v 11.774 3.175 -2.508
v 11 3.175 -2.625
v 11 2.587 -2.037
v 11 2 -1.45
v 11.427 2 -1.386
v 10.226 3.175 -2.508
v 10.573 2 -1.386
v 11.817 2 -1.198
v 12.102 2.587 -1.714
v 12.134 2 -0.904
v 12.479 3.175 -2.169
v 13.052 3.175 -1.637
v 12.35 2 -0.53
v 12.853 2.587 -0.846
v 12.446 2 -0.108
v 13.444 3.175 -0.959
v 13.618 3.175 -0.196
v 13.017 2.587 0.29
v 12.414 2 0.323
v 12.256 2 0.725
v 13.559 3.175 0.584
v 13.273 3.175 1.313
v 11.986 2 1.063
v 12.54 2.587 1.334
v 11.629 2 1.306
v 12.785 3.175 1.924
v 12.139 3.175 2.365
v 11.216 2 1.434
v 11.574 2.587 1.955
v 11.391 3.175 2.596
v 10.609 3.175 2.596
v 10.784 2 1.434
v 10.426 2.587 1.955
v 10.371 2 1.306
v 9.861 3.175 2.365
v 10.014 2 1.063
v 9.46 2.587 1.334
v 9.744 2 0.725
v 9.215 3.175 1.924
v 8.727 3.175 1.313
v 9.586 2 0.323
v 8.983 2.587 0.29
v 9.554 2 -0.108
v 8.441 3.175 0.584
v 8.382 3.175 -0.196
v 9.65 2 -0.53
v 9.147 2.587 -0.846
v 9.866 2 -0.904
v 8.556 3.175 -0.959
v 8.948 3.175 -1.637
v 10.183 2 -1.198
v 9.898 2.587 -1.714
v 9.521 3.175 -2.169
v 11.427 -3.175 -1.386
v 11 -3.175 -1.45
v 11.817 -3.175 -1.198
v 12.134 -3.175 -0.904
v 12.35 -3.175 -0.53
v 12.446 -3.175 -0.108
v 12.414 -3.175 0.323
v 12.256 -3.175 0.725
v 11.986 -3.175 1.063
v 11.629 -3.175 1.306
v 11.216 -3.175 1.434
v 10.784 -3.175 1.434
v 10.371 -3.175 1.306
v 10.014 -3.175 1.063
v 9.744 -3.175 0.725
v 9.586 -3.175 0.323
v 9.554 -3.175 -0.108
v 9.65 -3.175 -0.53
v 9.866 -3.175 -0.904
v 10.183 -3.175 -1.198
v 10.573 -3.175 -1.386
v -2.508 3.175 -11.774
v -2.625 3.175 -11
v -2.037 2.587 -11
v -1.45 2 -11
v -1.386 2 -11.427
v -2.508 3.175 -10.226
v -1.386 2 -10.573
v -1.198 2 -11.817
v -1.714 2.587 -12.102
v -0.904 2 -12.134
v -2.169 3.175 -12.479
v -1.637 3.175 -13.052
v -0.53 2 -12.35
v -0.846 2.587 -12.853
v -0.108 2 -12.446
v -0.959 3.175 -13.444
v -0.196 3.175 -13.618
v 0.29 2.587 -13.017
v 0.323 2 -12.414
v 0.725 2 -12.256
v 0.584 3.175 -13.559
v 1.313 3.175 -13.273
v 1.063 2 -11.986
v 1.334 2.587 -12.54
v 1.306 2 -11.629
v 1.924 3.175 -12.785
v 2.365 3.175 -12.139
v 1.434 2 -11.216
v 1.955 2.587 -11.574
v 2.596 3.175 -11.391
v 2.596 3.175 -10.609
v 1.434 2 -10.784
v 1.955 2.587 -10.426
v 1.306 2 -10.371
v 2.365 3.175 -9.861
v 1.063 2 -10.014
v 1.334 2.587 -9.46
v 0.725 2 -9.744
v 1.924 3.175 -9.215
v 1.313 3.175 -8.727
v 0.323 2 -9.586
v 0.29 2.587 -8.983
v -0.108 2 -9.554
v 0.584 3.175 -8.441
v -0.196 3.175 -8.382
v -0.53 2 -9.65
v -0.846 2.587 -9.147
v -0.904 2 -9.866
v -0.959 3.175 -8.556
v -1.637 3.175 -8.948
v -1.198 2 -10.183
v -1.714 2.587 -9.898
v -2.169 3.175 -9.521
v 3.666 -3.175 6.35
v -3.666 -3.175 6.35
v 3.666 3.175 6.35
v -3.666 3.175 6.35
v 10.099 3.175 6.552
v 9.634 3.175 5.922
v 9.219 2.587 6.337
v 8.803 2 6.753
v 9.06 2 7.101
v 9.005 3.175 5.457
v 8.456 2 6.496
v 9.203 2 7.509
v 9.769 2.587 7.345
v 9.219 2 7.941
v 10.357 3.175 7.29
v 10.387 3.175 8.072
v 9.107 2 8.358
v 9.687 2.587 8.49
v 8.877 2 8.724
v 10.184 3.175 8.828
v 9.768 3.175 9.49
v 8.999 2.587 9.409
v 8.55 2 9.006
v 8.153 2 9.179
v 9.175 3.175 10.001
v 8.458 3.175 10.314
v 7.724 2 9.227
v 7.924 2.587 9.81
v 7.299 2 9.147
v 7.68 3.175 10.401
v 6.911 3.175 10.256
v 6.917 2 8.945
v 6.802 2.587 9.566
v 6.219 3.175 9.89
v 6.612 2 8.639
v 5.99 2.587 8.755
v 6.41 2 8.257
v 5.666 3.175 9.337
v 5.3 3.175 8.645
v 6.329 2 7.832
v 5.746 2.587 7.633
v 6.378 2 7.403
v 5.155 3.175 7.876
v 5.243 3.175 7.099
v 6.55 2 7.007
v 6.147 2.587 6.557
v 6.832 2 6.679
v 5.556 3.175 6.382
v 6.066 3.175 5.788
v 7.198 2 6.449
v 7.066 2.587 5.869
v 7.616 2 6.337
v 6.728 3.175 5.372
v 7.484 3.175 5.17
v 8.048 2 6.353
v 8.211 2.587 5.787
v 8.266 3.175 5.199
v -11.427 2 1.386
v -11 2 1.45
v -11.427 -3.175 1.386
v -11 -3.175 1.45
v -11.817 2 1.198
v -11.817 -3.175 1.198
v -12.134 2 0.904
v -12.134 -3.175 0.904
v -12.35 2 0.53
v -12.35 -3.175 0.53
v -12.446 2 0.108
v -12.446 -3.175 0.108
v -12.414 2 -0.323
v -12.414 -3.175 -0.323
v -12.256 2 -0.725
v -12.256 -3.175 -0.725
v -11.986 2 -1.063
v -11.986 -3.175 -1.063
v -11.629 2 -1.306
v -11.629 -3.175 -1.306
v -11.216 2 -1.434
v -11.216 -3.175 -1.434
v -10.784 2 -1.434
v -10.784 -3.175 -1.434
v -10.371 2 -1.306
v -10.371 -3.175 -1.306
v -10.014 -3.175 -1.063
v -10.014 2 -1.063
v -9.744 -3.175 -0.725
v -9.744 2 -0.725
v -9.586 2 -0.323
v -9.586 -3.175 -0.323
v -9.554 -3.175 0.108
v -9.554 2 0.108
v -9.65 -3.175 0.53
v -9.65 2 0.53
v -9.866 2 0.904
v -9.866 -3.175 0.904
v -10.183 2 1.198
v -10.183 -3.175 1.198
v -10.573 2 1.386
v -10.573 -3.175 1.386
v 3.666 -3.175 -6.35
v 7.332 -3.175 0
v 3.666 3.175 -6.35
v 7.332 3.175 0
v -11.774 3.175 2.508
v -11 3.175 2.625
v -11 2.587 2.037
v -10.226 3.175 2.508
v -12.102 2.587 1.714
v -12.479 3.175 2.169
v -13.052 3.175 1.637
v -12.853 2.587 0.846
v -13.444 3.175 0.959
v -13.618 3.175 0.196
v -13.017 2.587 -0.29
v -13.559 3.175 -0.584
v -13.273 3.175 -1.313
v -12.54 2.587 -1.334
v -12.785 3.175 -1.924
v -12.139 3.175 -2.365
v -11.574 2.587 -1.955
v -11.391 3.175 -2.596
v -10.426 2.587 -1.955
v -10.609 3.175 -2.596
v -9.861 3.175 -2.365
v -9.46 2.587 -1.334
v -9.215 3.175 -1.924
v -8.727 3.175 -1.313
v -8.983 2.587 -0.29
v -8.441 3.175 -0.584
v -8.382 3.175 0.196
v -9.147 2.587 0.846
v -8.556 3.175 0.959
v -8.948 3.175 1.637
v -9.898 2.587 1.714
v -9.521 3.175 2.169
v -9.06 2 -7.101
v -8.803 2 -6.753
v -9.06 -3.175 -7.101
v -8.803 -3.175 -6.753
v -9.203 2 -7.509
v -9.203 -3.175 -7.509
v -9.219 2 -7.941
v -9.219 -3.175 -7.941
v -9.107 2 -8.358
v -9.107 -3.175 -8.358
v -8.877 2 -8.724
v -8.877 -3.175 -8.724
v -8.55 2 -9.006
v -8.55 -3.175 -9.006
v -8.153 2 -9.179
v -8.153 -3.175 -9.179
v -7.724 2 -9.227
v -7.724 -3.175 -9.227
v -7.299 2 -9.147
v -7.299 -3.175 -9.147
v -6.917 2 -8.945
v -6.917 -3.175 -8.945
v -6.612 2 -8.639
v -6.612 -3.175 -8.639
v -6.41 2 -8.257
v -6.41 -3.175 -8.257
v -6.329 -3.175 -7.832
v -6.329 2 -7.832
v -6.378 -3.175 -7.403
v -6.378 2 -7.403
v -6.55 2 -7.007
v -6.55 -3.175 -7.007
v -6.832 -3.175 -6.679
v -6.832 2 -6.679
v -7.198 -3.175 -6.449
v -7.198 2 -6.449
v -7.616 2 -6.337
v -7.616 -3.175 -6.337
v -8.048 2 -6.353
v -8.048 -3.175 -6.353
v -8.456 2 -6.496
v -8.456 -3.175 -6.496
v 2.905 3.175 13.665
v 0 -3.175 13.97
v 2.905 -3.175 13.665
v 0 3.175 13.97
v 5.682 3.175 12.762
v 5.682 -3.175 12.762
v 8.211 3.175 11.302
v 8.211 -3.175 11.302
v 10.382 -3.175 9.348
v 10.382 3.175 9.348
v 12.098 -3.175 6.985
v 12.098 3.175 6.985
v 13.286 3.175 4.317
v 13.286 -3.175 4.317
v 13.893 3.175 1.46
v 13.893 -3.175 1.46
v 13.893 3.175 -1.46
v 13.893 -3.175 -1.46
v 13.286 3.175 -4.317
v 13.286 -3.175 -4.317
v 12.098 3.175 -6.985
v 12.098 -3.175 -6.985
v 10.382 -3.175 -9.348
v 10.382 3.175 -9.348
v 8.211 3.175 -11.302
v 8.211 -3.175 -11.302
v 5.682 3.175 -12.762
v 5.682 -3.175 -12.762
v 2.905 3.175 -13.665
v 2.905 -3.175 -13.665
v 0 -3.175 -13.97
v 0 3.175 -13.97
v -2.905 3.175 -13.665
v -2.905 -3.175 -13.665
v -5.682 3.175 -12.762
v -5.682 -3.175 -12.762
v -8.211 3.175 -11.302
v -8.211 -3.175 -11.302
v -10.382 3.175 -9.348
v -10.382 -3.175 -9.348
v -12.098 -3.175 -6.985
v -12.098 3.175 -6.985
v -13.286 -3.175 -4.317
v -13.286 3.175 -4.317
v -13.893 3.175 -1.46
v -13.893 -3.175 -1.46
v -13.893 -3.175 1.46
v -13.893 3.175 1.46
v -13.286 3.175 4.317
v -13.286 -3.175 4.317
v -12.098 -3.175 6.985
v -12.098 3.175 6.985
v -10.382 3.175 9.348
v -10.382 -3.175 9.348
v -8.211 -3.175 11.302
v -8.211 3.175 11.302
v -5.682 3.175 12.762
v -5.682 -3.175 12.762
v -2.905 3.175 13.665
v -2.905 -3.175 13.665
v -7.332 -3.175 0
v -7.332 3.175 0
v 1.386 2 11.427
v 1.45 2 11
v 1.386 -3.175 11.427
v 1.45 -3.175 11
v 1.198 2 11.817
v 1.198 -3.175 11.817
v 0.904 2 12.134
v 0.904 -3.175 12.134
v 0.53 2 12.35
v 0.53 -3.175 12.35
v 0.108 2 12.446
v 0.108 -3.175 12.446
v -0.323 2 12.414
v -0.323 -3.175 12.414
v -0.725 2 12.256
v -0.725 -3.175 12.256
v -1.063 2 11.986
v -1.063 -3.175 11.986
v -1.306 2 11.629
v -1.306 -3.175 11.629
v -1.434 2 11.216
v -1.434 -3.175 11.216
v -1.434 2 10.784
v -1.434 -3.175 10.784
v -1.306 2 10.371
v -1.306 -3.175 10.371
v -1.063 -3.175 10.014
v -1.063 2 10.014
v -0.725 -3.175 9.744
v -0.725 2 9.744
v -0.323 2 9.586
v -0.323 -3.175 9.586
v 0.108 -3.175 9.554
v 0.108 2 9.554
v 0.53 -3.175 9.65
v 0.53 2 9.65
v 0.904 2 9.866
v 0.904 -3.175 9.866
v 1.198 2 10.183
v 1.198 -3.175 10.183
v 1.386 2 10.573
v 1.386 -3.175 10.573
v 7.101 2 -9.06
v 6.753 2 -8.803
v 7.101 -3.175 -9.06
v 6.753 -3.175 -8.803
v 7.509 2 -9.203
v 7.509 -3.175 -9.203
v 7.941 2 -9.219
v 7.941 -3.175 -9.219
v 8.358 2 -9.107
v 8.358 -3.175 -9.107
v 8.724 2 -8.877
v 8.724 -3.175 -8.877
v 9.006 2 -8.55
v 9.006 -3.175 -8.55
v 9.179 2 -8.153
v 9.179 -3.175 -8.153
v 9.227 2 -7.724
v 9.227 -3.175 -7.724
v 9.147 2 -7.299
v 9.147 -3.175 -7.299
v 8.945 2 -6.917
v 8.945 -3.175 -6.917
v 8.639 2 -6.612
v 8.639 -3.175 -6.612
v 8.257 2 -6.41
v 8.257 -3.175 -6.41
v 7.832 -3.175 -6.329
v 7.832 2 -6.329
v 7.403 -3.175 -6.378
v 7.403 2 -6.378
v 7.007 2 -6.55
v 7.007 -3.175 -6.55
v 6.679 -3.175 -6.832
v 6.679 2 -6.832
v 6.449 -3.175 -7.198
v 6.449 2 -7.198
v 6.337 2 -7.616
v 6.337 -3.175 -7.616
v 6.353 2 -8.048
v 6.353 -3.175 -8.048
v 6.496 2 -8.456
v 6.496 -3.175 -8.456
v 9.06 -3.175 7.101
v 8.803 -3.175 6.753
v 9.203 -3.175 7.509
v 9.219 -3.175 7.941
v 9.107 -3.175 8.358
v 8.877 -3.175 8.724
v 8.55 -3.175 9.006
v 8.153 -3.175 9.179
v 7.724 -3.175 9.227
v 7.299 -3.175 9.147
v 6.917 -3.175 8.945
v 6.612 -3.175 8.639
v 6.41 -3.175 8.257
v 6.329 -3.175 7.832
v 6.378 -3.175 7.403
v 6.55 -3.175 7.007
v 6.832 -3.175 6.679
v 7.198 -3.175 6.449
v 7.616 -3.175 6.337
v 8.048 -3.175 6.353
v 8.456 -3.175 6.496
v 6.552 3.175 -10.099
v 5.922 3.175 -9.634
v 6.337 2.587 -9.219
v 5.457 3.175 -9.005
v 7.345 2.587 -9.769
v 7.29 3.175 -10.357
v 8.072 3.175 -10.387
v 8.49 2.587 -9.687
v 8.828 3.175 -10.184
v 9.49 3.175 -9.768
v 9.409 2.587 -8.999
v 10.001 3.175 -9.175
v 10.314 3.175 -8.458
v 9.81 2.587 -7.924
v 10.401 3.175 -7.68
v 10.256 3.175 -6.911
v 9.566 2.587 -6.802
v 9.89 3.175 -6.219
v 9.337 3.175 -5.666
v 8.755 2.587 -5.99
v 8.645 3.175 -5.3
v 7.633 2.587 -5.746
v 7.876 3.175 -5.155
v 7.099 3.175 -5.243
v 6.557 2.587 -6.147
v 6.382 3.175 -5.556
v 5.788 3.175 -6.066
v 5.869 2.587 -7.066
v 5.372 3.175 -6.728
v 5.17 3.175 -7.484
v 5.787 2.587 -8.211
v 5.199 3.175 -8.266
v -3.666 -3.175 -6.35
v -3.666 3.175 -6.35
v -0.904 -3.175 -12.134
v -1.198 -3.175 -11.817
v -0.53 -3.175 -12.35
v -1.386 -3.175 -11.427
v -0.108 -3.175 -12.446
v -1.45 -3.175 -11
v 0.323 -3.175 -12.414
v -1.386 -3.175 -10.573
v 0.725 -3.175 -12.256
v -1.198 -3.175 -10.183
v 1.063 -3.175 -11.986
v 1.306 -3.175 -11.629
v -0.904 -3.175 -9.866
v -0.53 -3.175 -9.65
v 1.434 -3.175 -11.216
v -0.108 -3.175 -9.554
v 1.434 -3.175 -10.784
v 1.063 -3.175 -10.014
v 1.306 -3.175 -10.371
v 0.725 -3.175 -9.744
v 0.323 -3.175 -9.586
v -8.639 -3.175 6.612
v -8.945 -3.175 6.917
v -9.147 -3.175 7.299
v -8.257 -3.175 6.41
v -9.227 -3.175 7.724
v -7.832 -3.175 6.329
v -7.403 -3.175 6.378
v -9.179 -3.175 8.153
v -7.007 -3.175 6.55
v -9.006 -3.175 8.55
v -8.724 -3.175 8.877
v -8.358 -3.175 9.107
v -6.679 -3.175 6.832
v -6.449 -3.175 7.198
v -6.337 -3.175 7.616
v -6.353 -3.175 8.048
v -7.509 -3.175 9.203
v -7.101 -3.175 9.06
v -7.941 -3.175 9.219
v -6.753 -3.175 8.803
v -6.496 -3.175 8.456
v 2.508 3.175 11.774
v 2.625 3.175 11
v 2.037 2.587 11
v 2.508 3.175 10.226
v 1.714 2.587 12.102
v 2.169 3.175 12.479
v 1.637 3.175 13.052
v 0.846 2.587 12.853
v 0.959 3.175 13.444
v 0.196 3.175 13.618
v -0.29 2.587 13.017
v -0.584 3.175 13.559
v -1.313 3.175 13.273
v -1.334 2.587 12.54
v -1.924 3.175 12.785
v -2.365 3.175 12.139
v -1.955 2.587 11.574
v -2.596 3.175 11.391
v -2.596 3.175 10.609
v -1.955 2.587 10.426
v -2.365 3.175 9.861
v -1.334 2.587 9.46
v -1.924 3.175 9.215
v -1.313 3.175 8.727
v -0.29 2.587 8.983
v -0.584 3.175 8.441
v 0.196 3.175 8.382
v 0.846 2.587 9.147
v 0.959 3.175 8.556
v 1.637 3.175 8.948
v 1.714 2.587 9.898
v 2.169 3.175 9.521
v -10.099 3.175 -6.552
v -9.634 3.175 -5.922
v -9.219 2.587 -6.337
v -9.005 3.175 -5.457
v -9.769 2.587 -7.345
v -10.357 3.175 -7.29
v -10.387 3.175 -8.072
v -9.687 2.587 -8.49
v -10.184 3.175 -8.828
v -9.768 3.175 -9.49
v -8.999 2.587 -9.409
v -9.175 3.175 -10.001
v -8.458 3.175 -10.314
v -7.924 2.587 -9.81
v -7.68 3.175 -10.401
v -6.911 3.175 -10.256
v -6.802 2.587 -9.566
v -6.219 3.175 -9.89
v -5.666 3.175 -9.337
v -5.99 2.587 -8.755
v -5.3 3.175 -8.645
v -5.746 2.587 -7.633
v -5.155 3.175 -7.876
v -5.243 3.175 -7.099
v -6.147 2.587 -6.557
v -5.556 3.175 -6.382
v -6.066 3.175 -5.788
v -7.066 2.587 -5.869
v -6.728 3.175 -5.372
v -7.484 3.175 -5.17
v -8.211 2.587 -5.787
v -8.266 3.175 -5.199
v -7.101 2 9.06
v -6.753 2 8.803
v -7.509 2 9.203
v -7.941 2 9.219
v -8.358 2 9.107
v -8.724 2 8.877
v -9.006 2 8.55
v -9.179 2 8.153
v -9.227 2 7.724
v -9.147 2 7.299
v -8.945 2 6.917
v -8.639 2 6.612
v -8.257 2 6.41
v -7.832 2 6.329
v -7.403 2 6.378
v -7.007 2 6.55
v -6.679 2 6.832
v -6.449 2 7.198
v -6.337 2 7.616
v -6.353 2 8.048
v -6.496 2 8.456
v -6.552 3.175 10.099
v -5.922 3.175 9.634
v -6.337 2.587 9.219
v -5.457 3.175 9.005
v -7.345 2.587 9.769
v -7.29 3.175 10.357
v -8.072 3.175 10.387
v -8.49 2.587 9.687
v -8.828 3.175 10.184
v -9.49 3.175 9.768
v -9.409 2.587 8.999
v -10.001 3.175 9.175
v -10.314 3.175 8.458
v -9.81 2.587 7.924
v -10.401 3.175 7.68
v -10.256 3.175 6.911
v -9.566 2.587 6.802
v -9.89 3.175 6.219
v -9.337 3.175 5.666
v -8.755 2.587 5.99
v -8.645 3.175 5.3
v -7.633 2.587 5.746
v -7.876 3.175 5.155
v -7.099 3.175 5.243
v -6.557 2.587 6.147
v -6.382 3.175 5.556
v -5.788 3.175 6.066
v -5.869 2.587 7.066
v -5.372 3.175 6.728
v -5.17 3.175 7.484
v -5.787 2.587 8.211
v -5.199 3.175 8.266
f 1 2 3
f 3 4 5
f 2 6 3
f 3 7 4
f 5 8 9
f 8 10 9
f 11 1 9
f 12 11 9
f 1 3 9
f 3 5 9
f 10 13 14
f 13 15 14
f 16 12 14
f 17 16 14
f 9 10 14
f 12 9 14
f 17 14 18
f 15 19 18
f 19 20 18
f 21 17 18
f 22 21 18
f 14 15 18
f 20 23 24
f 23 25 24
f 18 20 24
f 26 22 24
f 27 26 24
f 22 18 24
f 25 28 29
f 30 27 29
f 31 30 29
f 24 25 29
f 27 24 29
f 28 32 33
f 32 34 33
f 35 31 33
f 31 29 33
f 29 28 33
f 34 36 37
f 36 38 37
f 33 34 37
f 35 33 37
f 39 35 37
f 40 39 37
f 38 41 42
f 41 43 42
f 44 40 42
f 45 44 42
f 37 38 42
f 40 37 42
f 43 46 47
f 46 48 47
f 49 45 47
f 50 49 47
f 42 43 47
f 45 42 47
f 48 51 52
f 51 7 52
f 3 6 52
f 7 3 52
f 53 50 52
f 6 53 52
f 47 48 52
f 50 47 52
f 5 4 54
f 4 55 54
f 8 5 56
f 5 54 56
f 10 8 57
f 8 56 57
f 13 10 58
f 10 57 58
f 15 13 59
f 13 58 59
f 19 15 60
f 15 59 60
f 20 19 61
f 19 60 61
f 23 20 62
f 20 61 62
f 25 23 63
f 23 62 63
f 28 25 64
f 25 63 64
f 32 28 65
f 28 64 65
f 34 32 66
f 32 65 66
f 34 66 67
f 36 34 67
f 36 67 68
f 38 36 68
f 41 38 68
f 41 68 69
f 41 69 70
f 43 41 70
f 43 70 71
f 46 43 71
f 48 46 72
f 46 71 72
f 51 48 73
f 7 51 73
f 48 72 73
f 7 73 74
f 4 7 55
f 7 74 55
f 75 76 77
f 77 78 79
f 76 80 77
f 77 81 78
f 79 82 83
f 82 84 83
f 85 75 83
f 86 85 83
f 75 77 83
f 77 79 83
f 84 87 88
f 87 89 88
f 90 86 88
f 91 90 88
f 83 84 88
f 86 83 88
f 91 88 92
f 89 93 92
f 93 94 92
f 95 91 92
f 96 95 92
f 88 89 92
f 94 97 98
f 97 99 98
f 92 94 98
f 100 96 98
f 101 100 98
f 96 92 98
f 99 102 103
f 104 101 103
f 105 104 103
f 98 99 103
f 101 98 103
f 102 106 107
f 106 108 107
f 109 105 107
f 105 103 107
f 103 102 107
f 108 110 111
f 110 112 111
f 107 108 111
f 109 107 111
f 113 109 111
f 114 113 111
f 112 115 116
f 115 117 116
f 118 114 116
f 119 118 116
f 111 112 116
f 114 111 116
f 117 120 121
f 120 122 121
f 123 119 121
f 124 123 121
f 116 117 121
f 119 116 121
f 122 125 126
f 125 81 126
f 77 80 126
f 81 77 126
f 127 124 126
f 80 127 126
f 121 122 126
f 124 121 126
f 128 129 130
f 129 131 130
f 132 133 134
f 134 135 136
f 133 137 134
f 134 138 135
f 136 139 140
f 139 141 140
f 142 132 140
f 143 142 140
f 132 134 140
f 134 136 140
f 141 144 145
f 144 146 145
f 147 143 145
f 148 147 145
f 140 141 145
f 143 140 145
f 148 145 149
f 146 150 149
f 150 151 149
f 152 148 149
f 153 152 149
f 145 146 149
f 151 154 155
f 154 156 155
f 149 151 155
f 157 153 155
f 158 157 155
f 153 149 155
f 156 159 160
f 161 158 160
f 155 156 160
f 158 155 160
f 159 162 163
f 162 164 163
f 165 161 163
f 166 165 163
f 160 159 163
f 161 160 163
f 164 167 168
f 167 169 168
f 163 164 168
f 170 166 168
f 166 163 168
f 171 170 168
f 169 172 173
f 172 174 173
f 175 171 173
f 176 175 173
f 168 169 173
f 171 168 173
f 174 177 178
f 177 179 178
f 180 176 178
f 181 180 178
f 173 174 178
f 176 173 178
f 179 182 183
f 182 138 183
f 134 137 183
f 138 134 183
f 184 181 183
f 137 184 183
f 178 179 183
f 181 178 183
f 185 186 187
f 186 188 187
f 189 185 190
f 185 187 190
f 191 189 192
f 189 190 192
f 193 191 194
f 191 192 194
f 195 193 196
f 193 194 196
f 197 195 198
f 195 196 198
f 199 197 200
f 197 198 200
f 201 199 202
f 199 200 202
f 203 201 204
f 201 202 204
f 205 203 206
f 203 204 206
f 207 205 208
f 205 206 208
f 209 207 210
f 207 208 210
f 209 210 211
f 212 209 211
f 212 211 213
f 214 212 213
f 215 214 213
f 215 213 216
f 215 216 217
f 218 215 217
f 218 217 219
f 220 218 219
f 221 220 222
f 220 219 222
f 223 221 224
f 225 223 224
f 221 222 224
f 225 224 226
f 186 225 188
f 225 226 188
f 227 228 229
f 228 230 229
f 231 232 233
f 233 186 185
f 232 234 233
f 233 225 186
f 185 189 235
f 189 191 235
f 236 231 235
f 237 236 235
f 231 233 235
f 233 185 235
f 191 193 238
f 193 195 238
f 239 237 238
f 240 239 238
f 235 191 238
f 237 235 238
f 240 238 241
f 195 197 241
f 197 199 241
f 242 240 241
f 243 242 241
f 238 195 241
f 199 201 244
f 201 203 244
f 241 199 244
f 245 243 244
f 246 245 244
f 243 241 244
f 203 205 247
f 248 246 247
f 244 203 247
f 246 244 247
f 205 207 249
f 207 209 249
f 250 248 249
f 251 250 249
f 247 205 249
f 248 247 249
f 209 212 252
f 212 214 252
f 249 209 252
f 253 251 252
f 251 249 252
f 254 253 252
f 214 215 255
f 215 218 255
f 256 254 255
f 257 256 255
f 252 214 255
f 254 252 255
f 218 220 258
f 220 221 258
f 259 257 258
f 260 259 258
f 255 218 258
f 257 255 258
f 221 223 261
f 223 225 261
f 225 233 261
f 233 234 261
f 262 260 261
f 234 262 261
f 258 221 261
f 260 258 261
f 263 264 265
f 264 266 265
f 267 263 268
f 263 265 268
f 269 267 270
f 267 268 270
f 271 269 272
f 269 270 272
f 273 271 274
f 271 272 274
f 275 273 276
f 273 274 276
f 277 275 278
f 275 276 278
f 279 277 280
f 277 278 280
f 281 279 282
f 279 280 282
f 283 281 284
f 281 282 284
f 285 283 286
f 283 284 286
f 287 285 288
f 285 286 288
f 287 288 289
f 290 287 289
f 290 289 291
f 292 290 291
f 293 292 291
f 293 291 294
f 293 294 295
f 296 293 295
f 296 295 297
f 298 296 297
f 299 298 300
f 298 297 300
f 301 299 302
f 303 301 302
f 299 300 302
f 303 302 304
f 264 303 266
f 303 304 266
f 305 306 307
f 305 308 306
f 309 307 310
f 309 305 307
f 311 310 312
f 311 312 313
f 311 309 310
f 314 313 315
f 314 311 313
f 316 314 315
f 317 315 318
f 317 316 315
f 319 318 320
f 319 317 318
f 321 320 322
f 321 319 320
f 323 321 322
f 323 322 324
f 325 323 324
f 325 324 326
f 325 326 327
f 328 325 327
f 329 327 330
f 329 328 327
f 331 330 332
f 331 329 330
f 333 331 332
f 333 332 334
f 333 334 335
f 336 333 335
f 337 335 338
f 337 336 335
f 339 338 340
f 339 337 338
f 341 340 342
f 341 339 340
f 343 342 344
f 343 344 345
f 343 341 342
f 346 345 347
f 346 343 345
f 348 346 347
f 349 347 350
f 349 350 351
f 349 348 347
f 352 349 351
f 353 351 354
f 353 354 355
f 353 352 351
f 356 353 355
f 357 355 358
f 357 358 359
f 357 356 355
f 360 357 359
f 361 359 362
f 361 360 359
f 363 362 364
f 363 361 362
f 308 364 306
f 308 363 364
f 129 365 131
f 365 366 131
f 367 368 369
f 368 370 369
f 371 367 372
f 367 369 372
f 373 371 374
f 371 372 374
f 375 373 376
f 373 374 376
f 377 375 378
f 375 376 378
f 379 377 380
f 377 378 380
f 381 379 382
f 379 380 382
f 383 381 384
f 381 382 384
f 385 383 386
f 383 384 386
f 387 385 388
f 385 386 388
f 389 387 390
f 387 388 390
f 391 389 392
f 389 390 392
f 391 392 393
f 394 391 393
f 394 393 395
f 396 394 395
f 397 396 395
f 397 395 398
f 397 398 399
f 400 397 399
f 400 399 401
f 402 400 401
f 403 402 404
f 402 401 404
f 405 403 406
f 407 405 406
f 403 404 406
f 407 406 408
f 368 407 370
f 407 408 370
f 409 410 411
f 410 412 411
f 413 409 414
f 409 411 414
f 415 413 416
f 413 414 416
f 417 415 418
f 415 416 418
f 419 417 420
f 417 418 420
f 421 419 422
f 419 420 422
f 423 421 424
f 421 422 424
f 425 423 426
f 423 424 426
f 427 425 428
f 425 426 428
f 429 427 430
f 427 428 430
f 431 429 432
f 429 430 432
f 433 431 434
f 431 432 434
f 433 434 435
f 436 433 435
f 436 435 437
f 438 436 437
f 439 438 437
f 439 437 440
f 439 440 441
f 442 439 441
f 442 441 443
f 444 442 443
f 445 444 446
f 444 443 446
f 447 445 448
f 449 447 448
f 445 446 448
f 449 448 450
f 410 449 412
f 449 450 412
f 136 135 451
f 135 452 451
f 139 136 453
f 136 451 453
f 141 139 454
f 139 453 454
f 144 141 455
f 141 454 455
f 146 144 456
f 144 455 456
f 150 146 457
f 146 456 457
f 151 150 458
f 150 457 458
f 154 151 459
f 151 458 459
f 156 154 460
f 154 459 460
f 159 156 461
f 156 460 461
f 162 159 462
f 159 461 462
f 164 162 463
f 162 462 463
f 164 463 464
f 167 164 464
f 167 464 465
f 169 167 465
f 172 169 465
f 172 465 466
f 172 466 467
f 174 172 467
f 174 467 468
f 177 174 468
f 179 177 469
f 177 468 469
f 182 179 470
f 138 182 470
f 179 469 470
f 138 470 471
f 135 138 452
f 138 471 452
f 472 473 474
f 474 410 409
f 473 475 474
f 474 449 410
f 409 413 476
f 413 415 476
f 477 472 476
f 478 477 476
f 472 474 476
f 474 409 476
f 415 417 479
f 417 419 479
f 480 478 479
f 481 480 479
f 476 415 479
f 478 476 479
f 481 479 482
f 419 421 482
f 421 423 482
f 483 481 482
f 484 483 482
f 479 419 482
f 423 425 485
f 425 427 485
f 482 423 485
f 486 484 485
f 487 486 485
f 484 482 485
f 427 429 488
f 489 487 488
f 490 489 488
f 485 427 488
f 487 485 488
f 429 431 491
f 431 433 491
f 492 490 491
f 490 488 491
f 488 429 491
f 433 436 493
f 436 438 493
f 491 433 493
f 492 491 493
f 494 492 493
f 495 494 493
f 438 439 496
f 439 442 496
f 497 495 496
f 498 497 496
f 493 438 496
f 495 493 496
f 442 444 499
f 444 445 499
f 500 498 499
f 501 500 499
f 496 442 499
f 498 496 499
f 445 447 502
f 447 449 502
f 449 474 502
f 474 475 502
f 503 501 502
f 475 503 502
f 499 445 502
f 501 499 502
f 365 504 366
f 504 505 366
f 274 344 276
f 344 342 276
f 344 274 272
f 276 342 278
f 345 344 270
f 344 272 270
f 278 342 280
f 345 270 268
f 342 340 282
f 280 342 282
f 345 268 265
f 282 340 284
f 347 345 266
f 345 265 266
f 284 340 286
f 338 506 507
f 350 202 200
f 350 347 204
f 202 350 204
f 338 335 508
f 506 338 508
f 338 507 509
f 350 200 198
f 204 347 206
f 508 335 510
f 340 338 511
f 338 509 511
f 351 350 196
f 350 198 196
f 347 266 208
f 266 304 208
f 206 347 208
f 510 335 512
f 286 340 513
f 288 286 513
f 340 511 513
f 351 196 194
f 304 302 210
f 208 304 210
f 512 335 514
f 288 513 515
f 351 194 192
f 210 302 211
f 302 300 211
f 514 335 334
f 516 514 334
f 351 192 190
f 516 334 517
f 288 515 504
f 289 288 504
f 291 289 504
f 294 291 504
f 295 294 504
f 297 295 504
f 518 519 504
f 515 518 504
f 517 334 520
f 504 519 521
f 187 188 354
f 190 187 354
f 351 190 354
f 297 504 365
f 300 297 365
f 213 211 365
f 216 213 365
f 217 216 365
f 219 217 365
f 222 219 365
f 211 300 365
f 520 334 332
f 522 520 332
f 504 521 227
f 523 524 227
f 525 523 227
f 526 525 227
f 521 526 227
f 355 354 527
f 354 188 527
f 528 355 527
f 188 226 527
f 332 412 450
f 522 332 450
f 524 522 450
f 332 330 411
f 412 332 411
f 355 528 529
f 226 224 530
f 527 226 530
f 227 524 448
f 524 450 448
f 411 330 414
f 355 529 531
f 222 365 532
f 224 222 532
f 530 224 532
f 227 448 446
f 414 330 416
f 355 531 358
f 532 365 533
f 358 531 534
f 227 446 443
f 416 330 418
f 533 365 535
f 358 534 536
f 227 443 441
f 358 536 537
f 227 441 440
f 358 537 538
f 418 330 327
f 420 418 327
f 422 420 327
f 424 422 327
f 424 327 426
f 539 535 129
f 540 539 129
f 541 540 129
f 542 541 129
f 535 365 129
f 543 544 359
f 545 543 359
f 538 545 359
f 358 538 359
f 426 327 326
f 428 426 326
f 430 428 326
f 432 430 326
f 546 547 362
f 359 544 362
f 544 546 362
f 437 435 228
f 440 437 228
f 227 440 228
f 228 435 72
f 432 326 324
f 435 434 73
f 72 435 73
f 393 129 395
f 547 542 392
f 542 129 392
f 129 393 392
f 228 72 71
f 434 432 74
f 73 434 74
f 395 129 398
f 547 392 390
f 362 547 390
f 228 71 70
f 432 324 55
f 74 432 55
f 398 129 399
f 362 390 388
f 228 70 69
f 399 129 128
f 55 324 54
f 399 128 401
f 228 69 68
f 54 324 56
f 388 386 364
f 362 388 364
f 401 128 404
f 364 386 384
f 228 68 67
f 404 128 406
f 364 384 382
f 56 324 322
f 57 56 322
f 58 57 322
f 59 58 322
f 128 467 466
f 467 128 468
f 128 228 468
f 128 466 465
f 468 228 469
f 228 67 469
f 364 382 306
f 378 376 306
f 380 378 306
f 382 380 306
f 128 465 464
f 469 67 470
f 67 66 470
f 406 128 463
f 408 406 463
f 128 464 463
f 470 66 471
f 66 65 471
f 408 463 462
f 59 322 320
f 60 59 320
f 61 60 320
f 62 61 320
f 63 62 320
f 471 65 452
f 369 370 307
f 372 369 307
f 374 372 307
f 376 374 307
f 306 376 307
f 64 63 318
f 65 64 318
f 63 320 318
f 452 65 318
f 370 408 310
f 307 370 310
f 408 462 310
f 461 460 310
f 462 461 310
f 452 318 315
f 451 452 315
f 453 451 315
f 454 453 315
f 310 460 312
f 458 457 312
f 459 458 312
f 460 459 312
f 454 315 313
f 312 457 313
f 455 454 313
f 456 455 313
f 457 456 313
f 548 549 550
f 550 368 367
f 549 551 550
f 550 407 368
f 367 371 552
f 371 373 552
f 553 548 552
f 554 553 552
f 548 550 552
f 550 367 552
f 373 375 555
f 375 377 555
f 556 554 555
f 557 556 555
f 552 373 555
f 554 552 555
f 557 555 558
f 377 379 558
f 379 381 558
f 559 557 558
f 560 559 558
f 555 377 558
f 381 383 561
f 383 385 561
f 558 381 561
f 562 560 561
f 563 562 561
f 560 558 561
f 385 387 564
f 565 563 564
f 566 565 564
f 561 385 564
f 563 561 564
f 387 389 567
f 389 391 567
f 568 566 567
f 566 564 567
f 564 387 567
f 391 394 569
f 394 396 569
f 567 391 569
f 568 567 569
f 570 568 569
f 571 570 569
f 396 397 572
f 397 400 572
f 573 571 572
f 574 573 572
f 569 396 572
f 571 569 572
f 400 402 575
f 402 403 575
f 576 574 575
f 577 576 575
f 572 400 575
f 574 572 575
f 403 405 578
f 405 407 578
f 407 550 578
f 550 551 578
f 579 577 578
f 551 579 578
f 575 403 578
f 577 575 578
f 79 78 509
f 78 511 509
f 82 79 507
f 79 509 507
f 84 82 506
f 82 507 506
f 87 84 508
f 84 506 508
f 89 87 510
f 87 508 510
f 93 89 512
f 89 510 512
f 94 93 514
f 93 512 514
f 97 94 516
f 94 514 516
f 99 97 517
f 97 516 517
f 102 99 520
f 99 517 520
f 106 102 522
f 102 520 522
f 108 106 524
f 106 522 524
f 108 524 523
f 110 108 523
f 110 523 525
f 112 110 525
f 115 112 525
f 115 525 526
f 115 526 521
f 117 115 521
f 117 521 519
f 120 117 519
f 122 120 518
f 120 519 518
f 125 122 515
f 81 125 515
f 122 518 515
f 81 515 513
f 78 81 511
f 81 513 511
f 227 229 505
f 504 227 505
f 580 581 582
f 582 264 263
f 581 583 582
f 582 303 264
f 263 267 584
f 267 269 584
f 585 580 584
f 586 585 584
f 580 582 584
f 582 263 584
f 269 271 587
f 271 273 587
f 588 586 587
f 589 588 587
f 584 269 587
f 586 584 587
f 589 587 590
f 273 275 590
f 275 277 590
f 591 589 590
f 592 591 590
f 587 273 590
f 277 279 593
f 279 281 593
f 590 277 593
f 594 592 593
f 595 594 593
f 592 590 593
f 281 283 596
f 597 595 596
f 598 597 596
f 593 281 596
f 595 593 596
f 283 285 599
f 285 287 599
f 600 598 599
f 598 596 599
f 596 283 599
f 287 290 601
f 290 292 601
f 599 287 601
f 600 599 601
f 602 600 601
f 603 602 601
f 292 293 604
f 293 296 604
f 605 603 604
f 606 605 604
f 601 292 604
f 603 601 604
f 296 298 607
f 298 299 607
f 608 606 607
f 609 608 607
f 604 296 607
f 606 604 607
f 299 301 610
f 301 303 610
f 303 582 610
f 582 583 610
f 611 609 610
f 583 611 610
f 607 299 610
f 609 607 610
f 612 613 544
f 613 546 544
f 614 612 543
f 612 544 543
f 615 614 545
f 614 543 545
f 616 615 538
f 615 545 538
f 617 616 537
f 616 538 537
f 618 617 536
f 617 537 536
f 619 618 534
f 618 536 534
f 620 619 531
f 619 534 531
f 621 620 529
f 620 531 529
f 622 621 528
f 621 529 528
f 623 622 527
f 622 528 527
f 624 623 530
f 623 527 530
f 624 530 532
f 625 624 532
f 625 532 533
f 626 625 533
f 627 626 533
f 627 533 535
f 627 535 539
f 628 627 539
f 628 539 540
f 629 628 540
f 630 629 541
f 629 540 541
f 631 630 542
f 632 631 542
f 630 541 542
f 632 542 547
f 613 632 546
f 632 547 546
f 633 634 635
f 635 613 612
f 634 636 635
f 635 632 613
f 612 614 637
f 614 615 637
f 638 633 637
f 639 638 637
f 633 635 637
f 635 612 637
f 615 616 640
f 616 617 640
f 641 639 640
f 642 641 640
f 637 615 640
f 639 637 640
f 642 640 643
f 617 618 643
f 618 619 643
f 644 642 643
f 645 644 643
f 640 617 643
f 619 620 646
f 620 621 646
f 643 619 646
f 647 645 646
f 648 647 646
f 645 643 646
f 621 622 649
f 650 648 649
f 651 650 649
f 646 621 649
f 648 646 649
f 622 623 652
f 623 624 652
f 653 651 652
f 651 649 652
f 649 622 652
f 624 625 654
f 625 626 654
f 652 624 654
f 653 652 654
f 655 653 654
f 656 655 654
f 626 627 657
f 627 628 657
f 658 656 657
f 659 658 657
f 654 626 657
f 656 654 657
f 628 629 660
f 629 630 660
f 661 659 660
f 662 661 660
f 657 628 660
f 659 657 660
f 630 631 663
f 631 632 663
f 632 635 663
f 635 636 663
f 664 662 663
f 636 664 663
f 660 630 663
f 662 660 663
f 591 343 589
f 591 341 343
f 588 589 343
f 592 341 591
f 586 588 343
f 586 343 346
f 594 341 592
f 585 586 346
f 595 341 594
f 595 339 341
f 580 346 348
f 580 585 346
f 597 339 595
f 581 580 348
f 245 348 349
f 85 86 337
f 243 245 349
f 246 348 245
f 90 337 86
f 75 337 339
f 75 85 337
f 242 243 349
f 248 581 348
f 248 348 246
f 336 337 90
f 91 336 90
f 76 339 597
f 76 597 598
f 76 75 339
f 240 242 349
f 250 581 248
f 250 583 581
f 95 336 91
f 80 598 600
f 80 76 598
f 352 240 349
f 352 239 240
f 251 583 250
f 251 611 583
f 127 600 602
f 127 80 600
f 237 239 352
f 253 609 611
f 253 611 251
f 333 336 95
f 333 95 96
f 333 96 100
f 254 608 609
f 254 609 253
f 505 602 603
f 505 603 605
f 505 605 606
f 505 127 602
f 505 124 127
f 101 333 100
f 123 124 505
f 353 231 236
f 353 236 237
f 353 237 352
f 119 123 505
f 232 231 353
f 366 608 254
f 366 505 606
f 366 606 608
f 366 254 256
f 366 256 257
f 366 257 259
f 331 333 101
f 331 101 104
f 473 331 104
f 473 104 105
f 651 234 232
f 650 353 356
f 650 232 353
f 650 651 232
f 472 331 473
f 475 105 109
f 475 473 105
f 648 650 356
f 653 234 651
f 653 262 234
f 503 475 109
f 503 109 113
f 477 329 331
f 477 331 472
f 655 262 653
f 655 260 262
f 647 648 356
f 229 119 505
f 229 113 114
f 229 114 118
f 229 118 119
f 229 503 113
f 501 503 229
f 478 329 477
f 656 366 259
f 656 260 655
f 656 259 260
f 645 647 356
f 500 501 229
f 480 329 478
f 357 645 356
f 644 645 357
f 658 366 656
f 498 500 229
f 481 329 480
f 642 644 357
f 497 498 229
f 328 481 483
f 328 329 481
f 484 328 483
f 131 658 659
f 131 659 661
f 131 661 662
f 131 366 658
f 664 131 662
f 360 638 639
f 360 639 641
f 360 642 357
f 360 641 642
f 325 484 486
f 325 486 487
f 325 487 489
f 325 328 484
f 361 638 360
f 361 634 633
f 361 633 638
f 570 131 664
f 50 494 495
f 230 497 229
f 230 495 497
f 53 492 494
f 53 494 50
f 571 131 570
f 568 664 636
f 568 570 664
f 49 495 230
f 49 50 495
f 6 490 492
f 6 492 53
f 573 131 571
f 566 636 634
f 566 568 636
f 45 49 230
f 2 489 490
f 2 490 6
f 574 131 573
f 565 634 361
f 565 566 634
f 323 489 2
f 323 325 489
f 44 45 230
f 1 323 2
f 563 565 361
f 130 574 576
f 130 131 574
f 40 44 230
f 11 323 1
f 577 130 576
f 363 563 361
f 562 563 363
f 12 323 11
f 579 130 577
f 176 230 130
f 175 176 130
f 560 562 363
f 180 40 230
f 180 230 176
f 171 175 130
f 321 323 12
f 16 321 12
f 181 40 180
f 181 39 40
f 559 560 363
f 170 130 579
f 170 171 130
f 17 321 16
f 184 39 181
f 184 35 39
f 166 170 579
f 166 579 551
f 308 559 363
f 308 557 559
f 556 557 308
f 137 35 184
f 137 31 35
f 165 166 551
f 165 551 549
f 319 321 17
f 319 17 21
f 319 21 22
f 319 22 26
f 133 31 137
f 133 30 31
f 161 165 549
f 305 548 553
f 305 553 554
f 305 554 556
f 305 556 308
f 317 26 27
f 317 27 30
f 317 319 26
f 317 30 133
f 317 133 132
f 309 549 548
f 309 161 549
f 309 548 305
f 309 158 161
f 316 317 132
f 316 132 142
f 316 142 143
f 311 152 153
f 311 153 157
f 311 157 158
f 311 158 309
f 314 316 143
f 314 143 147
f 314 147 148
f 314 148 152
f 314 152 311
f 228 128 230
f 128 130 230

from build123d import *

# Parameters (mm, degrees)
SKETCH1_R                        = 13.97
BOSS_EXTRUDE1_DEPTH              = 3.175
M2_5_CLEARANCE_HOLE1_D           = 2.9
M2_5_CLEARANCE_HOLE1_CSINK_D     = 5.25
M2_5_CLEARANCE_HOLE1_CSINK_ANGLE = 90
CIRPATTERN1_COUNT                = 8


with BuildPart() as part:
    # Sketch1 → Boss-Extrude1 (new, symmetric)
    with BuildSketch(Plane(origin=(0, 0, 0), x_dir=(1, 0, 0), z_dir=(0, 1, 0))):
        with Locations(Location((0, 0, 0), (0, 0, 270))):
            Circle(SKETCH1_R)
        Polygon((3.666174209, 6.35), (-3.666174209, 6.35), (-7.332348419, 0), (-3.666174209, -6.35), (3.666174209, -6.35), (7.332348419, 0), align=None, mode=Mode.SUBTRACT)
    extrude(amount=BOSS_EXTRUDE1_DEPTH, both=True)

    # M2.5 Clearance Hole1 (through all)
    with Locations(Plane(origin=(0, 3.175, 0), x_dir=(1, 0, 0), z_dir=(0, 1, 0))):
        with Locations((0, 11)):
            m2_5_clearance_hole1 = CounterSinkHole(M2_5_CLEARANCE_HOLE1_D / 2, M2_5_CLEARANCE_HOLE1_CSINK_D / 2, counter_sink_angle=M2_5_CLEARANCE_HOLE1_CSINK_ANGLE)

    # CirPattern1: M2.5 Clearance Hole1 ×8 about axis
    cirpattern1_axis = Axis((0, 0, 0), (0, 1, 0))
    for i in range(1, CIRPATTERN1_COUNT):
        add(m2_5_clearance_hole1.rotate(cirpattern1_axis, i * 360 / CIRPATTERN1_COUNT), mode=Mode.SUBTRACT)


solid = part.part
